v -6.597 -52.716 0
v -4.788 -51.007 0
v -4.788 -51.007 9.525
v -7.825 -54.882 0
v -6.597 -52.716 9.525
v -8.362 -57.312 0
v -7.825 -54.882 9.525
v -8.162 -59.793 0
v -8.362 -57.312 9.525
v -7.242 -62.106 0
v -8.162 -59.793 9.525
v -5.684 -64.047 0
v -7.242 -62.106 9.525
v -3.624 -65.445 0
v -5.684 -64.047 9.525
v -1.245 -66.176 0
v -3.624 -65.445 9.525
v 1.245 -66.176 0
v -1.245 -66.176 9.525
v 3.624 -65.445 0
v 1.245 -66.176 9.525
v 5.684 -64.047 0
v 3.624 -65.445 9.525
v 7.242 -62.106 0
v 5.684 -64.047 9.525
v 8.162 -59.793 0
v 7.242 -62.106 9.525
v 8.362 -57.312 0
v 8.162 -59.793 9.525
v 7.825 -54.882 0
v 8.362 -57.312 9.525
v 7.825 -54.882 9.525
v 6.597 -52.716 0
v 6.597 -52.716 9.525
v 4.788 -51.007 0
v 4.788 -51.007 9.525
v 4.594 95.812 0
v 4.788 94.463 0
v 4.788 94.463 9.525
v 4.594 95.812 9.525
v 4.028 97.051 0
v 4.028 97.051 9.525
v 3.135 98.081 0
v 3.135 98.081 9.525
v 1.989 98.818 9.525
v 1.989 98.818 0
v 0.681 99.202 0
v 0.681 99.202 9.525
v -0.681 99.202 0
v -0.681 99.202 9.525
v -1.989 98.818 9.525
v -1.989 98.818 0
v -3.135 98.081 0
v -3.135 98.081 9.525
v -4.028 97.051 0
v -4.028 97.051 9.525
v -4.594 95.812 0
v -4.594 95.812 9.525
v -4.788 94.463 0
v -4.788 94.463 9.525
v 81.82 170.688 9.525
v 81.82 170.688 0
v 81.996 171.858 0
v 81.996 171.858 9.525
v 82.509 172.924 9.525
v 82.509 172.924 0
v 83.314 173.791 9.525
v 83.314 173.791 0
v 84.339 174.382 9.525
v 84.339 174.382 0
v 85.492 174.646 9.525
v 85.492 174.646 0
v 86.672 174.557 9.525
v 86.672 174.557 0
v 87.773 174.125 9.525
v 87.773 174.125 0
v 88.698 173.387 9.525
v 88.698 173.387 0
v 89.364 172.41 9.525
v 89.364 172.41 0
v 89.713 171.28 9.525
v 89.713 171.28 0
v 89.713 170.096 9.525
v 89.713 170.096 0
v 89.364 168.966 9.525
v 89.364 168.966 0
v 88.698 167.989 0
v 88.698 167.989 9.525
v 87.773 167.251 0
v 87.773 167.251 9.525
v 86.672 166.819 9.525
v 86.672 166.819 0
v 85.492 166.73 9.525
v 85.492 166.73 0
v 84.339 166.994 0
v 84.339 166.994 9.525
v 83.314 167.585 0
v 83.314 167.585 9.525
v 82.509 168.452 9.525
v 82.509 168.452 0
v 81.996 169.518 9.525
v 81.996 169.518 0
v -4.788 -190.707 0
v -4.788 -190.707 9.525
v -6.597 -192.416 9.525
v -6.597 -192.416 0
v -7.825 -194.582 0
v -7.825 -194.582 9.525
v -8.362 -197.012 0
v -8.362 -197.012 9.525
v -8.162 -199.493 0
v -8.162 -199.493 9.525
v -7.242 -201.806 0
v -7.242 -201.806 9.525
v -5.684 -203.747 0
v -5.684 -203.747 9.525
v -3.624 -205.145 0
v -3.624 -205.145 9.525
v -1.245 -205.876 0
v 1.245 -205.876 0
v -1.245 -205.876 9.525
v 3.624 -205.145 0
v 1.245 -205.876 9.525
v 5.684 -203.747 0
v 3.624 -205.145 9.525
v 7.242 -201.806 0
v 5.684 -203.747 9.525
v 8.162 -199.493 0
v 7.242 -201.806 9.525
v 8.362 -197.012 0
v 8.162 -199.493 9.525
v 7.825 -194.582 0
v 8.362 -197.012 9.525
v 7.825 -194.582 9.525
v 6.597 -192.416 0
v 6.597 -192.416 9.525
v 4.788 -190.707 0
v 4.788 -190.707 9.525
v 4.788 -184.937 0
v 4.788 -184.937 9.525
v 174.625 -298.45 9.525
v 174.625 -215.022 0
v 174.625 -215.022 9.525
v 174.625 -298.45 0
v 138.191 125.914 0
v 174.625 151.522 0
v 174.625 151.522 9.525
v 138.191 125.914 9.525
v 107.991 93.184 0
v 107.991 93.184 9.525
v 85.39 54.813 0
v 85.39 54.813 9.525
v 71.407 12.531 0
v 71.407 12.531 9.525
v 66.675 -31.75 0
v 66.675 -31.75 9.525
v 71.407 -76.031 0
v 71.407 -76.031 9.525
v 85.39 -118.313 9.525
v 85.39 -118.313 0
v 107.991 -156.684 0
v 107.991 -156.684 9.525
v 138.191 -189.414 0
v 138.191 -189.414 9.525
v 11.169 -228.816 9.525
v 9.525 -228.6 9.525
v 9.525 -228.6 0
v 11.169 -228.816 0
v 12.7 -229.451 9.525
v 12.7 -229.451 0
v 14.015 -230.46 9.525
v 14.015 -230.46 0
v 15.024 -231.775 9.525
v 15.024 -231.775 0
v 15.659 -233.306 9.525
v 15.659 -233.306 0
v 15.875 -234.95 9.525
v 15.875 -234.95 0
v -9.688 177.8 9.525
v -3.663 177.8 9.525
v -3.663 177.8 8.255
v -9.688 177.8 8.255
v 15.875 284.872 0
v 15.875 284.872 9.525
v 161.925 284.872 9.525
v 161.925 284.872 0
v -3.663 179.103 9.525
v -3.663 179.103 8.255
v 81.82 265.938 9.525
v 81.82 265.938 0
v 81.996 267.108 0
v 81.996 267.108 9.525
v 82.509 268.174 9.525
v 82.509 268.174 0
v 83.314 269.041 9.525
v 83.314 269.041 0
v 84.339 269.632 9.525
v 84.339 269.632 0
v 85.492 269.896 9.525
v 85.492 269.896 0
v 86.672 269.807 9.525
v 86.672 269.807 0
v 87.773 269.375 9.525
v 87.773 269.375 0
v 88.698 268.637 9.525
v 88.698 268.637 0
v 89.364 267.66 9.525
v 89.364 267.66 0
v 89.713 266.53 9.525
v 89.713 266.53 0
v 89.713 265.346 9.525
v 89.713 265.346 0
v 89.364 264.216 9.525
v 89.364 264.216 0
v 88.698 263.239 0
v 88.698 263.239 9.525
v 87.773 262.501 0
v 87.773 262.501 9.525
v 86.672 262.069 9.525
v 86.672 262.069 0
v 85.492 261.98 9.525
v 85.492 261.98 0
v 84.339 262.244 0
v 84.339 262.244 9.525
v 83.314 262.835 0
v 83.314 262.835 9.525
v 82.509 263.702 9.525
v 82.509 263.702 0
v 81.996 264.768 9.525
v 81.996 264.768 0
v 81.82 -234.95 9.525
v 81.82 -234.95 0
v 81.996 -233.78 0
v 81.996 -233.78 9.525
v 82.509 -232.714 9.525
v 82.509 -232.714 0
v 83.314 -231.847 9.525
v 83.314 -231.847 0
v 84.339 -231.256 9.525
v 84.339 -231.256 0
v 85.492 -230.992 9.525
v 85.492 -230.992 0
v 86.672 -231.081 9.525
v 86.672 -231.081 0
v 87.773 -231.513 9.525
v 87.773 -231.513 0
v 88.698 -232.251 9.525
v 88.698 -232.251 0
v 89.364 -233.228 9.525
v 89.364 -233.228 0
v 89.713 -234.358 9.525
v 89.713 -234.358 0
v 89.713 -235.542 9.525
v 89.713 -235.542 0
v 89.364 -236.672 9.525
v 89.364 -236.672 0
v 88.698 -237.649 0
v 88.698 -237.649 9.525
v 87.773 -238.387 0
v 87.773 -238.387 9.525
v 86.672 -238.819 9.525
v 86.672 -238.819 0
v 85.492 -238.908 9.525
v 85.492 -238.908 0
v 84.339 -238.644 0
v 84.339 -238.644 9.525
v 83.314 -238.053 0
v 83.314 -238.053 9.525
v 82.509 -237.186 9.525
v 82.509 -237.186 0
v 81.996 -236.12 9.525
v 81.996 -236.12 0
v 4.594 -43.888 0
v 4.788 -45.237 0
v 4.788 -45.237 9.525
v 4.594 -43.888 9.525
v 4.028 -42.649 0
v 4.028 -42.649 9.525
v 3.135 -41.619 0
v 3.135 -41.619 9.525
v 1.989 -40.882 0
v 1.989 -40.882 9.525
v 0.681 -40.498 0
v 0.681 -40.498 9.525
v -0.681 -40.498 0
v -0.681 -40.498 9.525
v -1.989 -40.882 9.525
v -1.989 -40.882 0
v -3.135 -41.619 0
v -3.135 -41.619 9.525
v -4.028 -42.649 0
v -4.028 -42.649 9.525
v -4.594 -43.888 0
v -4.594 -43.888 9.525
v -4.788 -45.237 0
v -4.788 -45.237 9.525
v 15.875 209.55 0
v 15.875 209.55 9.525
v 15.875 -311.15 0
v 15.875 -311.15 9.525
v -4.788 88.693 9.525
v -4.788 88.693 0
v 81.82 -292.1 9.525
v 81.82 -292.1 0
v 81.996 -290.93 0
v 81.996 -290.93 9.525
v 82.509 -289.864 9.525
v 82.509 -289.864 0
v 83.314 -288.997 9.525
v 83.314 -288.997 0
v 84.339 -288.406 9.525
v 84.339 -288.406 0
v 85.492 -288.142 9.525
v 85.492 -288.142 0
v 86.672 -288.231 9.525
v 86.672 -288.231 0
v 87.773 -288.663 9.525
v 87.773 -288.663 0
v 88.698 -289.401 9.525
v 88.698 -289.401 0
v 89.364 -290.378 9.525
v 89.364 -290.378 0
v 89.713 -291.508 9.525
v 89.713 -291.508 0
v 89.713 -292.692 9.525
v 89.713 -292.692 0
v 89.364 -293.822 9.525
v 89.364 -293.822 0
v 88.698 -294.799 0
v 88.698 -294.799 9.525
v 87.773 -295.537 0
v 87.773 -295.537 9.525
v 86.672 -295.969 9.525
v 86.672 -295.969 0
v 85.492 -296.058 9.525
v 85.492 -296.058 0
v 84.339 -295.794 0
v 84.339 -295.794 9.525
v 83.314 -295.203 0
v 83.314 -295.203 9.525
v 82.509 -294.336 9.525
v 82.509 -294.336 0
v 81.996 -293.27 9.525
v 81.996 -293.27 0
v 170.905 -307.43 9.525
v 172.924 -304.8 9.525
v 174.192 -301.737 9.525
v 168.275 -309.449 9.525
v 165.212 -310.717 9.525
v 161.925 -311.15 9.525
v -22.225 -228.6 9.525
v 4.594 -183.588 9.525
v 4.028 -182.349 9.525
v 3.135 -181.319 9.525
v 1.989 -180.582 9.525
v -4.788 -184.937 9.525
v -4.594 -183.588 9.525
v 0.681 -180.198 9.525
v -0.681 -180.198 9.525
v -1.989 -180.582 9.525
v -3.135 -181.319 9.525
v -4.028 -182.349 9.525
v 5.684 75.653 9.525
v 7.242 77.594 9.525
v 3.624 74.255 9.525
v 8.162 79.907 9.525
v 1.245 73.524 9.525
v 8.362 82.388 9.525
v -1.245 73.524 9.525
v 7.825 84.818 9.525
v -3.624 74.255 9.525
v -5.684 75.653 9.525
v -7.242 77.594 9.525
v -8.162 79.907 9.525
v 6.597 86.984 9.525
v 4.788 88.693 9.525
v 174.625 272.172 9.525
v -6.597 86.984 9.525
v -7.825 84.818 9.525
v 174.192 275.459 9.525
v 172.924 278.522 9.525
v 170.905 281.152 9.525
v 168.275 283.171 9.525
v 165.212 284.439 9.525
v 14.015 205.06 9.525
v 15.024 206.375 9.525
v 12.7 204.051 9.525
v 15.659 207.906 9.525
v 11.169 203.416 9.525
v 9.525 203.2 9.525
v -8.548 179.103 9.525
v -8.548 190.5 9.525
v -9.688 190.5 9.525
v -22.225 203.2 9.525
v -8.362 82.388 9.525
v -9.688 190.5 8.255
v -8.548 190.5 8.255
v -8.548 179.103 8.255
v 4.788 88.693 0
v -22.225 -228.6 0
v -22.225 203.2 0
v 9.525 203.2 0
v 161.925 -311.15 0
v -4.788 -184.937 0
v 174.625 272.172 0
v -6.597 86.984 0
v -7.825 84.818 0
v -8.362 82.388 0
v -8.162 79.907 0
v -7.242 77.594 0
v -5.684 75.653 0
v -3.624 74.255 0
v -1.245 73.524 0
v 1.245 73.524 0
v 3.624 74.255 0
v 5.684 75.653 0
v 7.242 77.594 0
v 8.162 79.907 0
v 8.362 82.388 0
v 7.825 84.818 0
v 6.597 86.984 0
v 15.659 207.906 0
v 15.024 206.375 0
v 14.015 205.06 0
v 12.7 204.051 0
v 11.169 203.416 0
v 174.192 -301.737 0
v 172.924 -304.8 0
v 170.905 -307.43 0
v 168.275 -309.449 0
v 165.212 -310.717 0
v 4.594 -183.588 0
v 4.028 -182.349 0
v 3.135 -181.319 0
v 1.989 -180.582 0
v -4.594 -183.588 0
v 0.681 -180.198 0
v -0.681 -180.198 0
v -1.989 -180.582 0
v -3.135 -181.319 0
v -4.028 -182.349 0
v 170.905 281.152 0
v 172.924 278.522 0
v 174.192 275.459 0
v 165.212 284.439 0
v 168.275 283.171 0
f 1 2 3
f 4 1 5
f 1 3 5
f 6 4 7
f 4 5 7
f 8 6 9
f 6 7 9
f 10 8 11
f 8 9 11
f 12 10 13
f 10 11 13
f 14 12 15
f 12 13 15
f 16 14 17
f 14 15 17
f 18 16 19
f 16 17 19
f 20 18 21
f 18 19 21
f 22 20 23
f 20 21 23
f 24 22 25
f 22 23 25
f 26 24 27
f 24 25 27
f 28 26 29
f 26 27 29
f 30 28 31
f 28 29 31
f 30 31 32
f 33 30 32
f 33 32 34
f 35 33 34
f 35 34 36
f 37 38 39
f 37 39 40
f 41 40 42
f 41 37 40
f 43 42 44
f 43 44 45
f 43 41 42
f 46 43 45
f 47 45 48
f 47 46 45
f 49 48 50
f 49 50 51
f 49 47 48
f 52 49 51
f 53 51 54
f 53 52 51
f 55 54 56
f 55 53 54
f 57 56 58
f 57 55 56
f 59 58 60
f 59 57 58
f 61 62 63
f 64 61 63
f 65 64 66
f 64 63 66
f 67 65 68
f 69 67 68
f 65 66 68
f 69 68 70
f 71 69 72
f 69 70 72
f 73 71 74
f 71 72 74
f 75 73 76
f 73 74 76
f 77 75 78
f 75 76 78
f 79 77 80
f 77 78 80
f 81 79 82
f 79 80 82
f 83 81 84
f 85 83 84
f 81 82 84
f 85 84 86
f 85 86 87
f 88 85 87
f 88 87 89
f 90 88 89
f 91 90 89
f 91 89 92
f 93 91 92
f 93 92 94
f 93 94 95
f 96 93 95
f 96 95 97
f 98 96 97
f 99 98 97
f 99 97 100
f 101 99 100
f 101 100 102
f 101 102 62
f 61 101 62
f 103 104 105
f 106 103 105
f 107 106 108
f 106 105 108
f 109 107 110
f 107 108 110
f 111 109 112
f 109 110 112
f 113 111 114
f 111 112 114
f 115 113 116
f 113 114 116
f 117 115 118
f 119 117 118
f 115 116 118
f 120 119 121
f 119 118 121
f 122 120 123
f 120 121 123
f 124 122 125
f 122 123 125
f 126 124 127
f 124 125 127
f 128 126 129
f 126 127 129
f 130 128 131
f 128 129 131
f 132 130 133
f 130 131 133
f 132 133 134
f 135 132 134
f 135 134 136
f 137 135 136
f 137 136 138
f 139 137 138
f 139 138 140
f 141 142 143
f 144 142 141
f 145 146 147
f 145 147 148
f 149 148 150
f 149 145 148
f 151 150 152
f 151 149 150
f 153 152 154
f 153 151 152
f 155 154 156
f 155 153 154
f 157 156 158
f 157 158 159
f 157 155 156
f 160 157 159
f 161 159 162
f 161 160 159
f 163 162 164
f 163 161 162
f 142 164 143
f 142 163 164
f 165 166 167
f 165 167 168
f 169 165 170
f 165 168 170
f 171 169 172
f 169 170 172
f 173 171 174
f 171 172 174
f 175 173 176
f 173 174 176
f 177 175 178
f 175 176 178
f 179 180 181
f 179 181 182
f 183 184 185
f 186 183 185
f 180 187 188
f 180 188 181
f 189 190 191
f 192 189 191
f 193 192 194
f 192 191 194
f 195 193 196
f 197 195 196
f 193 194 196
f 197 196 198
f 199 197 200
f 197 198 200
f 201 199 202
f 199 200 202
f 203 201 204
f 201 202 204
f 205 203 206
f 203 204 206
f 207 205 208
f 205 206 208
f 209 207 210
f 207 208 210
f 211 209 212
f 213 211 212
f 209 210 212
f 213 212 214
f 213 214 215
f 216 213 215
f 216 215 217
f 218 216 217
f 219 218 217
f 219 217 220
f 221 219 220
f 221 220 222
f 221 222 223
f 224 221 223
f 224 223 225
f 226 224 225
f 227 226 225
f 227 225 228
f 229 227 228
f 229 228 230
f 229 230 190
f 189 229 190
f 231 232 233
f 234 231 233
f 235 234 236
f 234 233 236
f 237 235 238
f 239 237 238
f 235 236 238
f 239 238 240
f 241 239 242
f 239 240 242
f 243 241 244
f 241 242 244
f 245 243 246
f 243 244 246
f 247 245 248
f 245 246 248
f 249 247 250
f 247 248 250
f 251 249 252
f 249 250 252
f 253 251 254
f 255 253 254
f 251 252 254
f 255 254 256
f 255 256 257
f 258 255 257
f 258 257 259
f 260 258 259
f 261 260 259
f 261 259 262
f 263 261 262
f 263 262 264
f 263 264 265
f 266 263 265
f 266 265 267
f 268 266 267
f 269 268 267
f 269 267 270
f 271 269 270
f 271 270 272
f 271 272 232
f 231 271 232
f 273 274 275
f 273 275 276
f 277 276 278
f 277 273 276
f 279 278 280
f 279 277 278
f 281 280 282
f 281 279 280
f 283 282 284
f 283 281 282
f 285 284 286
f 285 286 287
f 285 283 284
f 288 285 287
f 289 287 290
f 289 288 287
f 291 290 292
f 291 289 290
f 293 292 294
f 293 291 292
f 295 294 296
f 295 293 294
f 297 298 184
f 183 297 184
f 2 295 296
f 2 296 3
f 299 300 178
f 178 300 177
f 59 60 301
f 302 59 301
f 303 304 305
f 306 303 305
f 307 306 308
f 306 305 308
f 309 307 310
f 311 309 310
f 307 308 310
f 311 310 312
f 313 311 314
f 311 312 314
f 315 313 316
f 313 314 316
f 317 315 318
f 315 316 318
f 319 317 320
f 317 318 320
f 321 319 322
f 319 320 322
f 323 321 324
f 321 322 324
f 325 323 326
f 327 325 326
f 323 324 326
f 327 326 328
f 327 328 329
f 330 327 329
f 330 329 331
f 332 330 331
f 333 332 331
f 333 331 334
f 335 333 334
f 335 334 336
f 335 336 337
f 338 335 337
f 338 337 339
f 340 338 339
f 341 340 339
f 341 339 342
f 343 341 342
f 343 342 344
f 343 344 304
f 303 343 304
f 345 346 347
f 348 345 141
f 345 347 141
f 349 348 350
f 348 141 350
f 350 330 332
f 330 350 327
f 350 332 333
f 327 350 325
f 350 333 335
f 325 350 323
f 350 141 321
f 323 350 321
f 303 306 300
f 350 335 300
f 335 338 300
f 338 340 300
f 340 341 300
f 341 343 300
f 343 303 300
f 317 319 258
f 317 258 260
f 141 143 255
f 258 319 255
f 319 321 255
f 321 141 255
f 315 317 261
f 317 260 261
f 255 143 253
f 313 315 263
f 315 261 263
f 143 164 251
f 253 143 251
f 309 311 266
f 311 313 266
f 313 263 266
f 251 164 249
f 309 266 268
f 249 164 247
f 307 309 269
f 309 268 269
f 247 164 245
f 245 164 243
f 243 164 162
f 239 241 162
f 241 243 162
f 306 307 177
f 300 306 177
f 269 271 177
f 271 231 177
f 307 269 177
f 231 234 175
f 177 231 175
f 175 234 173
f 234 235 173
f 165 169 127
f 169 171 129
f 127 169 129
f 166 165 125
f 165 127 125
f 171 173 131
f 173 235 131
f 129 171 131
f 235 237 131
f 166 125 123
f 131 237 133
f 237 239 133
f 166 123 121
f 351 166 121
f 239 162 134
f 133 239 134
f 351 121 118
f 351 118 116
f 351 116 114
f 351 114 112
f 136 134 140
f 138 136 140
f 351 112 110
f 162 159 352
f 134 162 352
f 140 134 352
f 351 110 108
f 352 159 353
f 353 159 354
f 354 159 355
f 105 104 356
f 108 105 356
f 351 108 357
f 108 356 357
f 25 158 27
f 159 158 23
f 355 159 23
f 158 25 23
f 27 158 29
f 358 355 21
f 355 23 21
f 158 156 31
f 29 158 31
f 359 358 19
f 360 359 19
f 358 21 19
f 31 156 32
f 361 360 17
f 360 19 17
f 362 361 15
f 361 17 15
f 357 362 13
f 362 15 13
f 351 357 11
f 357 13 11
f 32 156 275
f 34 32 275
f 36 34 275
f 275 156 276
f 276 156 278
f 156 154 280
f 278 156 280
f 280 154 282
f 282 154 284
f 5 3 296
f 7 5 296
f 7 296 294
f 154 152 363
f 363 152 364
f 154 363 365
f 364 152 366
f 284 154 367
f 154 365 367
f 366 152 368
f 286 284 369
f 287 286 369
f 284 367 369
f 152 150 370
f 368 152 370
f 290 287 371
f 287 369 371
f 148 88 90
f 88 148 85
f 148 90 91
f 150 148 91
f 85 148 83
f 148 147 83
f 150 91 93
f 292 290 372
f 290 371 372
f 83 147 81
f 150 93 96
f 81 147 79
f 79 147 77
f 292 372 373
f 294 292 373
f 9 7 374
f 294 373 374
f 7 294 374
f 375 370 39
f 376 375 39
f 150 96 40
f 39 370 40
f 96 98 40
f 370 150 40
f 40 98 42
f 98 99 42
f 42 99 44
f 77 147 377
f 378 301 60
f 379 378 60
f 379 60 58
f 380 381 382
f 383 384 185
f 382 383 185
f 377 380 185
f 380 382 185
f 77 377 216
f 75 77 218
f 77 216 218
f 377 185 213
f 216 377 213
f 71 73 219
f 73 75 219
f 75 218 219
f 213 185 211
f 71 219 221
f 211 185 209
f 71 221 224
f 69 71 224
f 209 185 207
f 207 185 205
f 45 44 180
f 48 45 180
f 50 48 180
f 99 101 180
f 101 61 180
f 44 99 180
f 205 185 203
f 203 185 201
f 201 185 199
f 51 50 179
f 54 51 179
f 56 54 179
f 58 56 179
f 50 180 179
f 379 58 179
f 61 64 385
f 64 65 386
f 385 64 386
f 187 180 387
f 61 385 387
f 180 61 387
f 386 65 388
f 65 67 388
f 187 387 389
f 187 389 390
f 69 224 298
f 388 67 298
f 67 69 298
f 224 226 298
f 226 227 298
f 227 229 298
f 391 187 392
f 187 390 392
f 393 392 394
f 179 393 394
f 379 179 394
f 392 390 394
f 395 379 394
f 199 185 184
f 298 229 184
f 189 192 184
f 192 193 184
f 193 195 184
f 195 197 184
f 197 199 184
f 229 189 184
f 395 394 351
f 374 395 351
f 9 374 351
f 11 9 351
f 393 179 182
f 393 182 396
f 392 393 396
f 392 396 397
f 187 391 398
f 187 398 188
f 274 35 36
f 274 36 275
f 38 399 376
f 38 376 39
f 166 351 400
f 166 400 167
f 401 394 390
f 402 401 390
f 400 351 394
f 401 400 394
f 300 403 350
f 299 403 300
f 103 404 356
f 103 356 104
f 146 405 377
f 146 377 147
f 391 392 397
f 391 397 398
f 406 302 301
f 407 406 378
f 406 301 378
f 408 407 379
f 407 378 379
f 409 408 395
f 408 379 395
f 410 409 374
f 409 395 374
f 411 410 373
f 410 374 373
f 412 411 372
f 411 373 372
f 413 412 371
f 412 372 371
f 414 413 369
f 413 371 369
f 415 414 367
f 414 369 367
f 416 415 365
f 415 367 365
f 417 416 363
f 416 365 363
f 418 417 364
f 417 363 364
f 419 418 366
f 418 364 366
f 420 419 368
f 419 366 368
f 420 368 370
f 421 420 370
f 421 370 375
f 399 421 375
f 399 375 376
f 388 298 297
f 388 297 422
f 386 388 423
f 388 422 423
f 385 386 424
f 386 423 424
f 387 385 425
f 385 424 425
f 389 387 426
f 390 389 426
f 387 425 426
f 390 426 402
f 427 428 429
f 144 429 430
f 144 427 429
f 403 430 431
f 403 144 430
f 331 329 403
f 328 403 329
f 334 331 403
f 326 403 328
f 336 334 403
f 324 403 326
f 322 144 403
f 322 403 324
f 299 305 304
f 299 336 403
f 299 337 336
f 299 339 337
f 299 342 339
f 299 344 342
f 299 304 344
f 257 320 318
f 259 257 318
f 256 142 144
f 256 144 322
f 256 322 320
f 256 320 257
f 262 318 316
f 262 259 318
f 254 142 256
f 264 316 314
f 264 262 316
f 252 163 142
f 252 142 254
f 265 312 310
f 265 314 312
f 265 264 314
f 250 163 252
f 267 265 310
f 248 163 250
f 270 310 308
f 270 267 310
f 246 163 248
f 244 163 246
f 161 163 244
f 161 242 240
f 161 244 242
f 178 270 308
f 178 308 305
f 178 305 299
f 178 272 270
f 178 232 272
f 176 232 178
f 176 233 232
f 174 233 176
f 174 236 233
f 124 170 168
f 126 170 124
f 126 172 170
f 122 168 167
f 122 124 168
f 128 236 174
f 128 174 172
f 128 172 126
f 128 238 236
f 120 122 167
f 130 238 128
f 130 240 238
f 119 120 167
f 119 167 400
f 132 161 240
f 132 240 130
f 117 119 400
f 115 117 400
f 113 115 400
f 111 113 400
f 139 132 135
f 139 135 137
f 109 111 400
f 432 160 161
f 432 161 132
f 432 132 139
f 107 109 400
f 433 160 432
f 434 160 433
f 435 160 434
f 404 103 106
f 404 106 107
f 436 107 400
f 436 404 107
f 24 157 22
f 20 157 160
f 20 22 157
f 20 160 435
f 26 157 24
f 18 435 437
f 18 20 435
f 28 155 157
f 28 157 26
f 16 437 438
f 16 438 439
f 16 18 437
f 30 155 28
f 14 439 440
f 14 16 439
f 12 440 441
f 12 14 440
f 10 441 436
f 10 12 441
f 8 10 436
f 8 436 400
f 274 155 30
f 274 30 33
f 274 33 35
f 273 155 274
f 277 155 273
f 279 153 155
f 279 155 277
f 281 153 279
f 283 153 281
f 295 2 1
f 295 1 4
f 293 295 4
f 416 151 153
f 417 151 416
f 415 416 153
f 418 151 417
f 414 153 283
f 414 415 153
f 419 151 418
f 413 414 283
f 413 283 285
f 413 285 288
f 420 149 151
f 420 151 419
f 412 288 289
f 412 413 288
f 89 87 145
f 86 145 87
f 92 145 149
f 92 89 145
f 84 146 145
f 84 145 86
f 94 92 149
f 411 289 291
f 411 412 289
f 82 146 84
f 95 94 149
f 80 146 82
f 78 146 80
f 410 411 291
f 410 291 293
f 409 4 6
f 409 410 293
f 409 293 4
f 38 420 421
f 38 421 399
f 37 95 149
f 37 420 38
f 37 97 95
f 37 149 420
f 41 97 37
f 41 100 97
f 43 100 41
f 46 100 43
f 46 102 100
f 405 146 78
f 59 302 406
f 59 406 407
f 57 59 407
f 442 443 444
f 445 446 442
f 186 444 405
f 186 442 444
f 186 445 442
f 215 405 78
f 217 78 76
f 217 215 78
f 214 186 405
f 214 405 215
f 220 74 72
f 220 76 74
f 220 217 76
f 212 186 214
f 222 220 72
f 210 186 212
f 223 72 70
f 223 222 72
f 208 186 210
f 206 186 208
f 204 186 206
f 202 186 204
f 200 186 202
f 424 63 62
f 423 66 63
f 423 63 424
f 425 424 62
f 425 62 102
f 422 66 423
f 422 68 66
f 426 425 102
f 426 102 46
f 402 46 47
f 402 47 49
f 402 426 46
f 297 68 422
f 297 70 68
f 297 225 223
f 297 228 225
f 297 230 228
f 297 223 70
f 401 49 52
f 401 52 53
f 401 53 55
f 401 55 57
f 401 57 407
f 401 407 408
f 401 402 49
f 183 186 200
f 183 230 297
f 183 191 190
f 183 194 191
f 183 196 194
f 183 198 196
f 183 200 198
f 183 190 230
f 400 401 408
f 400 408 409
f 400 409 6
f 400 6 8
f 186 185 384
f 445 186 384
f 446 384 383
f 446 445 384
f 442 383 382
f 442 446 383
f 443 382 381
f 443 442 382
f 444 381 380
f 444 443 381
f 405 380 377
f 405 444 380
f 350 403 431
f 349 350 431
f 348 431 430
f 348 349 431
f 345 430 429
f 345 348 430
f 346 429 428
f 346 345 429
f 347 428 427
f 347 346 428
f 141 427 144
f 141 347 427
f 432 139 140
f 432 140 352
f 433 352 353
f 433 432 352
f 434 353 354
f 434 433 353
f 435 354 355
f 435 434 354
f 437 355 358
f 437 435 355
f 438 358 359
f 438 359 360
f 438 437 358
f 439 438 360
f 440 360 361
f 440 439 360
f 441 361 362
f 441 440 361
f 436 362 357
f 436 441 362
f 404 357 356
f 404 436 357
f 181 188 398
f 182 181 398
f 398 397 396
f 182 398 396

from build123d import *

# Parameters (mm, degrees)
BOSS_EXTRUDE1_DEPTH            = 9.525
V_0_377_DIAMETER_SLOT2_DEPTH   = 9.525
CUT_EXTRUDE1_REACH             = 358.93
SKETCH6_W                      = 152.4
SKETCH6_H                      = 622.3
FILLET1_R                      = 12.7
SKETCH7_R                      = 8.382
CUT_EXTRUDE2_DEPTH             = 357.929879318
SKETCH12_W                     = 38.1
SKETCH12_H                     = 107.95
SKETCH12_H_2                   = 82.55
CUT_EXTRUDE3_DEPTH             = 357.929879318
FILLET2_R                      = 6.35
F_5_16_0_3125_DIAMETER_HOLE1_D = 7.9375
SKETCH16_W                     = 158.75
SKETCH16_H                     = 26.277954941
CUT_EXTRUDE4_DEPTH             = 357.929879318
F_5_16_0_3125_DIAMETER_HOLE2_D = 7.9375
FILLET3_R                      = 12.7
CUT_EXTRUDE5_DEPTH             = 1.27


# Read off the part's stored shape, not the designer's step: V (0.377) Diameter Slot2
with BuildPart() as part:
    # Sketch1 → Boss-Extrude1 (new body)
    with BuildSketch(Plane.XY):
        with BuildLine():
            Line((-174.625, 151.522045059), (-174.625, 311.15))
            Line((-174.625, 311.15), (174.625, 311.15))
            Line((174.625, 311.15), (174.625, 151.522045059))
            ThreePointArc((174.625, 151.522045059), (66.675, -31.75), (174.625, -215.022045059))
            Line((174.625, -215.022045059), (174.625, -311.15))
            Line((174.625, -311.15), (-174.625, -311.15))
            Line((-174.625, -311.15), (-174.625, -215.022045059))
            ThreePointArc((-174.625, -215.022045059), (-66.675, -31.75), (-174.625, 151.522045059))
        make_face()
    extrude(amount=BOSS_EXTRUDE1_DEPTH)

    # V (0.377) Diameter Slot2 outline → V (0.377) Diameter Slot2 (cut)
    with BuildSketch(Plane.XY):
        with BuildLine():
            Line((4.7879, -57.8866), (4.7879, -45.2374))
            ThreePointArc((4.7879, -45.2374), (0, -40.4495), (-4.7879, -45.2374))
            Line((-4.7879, -45.2374), (-4.7879, -57.8866))
            ThreePointArc((-4.7879, -57.8866), (0, -62.6745), (4.7879, -57.8866))
        make_face()
        with BuildLine():
            ThreePointArc((4.7879, 94.4626), (0, 99.2505), (-4.7879, 94.4626))
            Line((-4.7879, 94.4626), (-4.7879, 81.8134))
            ThreePointArc((-4.7879, 81.8134), (0, 77.0255), (4.7879, 81.8134))
            Line((4.7879, 81.8134), (4.7879, 94.4626))
        make_face()
        with BuildLine():
            ThreePointArc((4.7879, -184.9374), (0, -180.1495), (-4.7879, -184.9374))
            Line((-4.7879, -184.9374), (-4.7879, -197.5866))
            ThreePointArc((-4.7879, -197.5866), (0, -202.3745), (4.7879, -197.5866))
            Line((4.7879, -197.5866), (4.7879, -184.9374))
        make_face()
    extrude(amount=V_0_377_DIAMETER_SLOT2_DEPTH, mode=Mode.SUBTRACT)

    # Sketch6 → Cut-Extrude1 (cut, up to next)
    with BuildSketch(Plane.XY.offset(9.525), mode=Mode.PRIVATE) as cut_extrude1_sk1:
        with Locations((-98.425, 0)):
            Rectangle(SKETCH6_W, SKETCH6_H)
    cut_extrude1_tool1 = extrude(cut_extrude1_sk1.sketch, amount=-CUT_EXTRUDE1_REACH, mode=Mode.PRIVATE) & part.part
    add(cut_extrude1_tool1.solids().sort_by_distance((-98.425, 0, 9.525))[0], mode=Mode.SUBTRACT)

    # Fillet1
    fillet1_edges = [part.edges().sort_by_distance(p)[0] for p in [
        (174.625, -311.15, 4.7625),
    ]]
    fillet(fillet1_edges, radius=FILLET1_R)

    # Sketch7 → Cut-Extrude2 (cut, through all)
    with BuildSketch(Plane.XY.offset(9.525)):
        with Locations((0, -197.5866)):
            Circle(SKETCH7_R)
        with Locations((0, 81.8134)):
            Circle(SKETCH7_R)
        with Locations((0, -57.8866)):
            Circle(SKETCH7_R)
    extrude(amount=-CUT_EXTRUDE2_DEPTH, mode=Mode.SUBTRACT)

    # Sketch12 → Cut-Extrude3 (cut, through all)
    with BuildSketch(Plane.XY.offset(9.525)):
        with Locations((-3.175, 257.175)):
            Rectangle(SKETCH12_W, SKETCH12_H)
        with Locations((-3.175, -269.875)):
            Rectangle(SKETCH12_W, SKETCH12_H_2)
    extrude(amount=-CUT_EXTRUDE3_DEPTH, mode=Mode.SUBTRACT)

    # Fillet2
    fillet2_edges = [part.edges().sort_by_distance(p)[0] for p in [
        (15.875, 203.2, 4.7625),
        (15.875, -228.6, 4.7625),
    ]]
    fillet(fillet2_edges, radius=FILLET2_R)

    # 5/16 (0.3125) Diameter Hole1 (through all)
    with Locations(Plane.XY.offset(9.525)):
        with Locations((85.7885, 170.688), (85.7885, 265.938)):
            Hole(F_5_16_0_3125_DIAMETER_HOLE1_D / 2)

    # Sketch16 → Cut-Extrude4 (cut, through all)
    with BuildSketch(Plane.XY.offset(9.525)):
        with Locations((95.25, 298.011022529)):
            Rectangle(SKETCH16_W, SKETCH16_H)
    extrude(amount=-CUT_EXTRUDE4_DEPTH, mode=Mode.SUBTRACT)

    # 5/16 (0.3125) Diameter Hole2 (through all)
    with Locations(Plane.XY.offset(9.525)):
        with Locations((85.7885, -234.95), (85.7885, -292.1)):
            Hole(F_5_16_0_3125_DIAMETER_HOLE2_D / 2)

    # Fillet3
    fillet3_edges = [part.edges().sort_by_distance(p)[0] for p in [
        (174.625, 284.872045059, 4.7625),
    ]]
    fillet(fillet3_edges, radius=FILLET3_R)

    # Sketch22 → Cut-Extrude5 (cut)
    with BuildSketch(Plane(origin=(0, 0, 9.525), x_dir=(-1, 0, 0), z_dir=(0, 0, -1))):
        Polygon((9.687820513, 190.5), (8.548076923, 190.5), (8.548076923, 179.102564103), (3.663461538, 179.102564103), (3.663461538, 177.8), (9.687820513, 177.8), align=None)
    extrude(amount=CUT_EXTRUDE5_DEPTH, mode=Mode.SUBTRACT)


solid = part.part
